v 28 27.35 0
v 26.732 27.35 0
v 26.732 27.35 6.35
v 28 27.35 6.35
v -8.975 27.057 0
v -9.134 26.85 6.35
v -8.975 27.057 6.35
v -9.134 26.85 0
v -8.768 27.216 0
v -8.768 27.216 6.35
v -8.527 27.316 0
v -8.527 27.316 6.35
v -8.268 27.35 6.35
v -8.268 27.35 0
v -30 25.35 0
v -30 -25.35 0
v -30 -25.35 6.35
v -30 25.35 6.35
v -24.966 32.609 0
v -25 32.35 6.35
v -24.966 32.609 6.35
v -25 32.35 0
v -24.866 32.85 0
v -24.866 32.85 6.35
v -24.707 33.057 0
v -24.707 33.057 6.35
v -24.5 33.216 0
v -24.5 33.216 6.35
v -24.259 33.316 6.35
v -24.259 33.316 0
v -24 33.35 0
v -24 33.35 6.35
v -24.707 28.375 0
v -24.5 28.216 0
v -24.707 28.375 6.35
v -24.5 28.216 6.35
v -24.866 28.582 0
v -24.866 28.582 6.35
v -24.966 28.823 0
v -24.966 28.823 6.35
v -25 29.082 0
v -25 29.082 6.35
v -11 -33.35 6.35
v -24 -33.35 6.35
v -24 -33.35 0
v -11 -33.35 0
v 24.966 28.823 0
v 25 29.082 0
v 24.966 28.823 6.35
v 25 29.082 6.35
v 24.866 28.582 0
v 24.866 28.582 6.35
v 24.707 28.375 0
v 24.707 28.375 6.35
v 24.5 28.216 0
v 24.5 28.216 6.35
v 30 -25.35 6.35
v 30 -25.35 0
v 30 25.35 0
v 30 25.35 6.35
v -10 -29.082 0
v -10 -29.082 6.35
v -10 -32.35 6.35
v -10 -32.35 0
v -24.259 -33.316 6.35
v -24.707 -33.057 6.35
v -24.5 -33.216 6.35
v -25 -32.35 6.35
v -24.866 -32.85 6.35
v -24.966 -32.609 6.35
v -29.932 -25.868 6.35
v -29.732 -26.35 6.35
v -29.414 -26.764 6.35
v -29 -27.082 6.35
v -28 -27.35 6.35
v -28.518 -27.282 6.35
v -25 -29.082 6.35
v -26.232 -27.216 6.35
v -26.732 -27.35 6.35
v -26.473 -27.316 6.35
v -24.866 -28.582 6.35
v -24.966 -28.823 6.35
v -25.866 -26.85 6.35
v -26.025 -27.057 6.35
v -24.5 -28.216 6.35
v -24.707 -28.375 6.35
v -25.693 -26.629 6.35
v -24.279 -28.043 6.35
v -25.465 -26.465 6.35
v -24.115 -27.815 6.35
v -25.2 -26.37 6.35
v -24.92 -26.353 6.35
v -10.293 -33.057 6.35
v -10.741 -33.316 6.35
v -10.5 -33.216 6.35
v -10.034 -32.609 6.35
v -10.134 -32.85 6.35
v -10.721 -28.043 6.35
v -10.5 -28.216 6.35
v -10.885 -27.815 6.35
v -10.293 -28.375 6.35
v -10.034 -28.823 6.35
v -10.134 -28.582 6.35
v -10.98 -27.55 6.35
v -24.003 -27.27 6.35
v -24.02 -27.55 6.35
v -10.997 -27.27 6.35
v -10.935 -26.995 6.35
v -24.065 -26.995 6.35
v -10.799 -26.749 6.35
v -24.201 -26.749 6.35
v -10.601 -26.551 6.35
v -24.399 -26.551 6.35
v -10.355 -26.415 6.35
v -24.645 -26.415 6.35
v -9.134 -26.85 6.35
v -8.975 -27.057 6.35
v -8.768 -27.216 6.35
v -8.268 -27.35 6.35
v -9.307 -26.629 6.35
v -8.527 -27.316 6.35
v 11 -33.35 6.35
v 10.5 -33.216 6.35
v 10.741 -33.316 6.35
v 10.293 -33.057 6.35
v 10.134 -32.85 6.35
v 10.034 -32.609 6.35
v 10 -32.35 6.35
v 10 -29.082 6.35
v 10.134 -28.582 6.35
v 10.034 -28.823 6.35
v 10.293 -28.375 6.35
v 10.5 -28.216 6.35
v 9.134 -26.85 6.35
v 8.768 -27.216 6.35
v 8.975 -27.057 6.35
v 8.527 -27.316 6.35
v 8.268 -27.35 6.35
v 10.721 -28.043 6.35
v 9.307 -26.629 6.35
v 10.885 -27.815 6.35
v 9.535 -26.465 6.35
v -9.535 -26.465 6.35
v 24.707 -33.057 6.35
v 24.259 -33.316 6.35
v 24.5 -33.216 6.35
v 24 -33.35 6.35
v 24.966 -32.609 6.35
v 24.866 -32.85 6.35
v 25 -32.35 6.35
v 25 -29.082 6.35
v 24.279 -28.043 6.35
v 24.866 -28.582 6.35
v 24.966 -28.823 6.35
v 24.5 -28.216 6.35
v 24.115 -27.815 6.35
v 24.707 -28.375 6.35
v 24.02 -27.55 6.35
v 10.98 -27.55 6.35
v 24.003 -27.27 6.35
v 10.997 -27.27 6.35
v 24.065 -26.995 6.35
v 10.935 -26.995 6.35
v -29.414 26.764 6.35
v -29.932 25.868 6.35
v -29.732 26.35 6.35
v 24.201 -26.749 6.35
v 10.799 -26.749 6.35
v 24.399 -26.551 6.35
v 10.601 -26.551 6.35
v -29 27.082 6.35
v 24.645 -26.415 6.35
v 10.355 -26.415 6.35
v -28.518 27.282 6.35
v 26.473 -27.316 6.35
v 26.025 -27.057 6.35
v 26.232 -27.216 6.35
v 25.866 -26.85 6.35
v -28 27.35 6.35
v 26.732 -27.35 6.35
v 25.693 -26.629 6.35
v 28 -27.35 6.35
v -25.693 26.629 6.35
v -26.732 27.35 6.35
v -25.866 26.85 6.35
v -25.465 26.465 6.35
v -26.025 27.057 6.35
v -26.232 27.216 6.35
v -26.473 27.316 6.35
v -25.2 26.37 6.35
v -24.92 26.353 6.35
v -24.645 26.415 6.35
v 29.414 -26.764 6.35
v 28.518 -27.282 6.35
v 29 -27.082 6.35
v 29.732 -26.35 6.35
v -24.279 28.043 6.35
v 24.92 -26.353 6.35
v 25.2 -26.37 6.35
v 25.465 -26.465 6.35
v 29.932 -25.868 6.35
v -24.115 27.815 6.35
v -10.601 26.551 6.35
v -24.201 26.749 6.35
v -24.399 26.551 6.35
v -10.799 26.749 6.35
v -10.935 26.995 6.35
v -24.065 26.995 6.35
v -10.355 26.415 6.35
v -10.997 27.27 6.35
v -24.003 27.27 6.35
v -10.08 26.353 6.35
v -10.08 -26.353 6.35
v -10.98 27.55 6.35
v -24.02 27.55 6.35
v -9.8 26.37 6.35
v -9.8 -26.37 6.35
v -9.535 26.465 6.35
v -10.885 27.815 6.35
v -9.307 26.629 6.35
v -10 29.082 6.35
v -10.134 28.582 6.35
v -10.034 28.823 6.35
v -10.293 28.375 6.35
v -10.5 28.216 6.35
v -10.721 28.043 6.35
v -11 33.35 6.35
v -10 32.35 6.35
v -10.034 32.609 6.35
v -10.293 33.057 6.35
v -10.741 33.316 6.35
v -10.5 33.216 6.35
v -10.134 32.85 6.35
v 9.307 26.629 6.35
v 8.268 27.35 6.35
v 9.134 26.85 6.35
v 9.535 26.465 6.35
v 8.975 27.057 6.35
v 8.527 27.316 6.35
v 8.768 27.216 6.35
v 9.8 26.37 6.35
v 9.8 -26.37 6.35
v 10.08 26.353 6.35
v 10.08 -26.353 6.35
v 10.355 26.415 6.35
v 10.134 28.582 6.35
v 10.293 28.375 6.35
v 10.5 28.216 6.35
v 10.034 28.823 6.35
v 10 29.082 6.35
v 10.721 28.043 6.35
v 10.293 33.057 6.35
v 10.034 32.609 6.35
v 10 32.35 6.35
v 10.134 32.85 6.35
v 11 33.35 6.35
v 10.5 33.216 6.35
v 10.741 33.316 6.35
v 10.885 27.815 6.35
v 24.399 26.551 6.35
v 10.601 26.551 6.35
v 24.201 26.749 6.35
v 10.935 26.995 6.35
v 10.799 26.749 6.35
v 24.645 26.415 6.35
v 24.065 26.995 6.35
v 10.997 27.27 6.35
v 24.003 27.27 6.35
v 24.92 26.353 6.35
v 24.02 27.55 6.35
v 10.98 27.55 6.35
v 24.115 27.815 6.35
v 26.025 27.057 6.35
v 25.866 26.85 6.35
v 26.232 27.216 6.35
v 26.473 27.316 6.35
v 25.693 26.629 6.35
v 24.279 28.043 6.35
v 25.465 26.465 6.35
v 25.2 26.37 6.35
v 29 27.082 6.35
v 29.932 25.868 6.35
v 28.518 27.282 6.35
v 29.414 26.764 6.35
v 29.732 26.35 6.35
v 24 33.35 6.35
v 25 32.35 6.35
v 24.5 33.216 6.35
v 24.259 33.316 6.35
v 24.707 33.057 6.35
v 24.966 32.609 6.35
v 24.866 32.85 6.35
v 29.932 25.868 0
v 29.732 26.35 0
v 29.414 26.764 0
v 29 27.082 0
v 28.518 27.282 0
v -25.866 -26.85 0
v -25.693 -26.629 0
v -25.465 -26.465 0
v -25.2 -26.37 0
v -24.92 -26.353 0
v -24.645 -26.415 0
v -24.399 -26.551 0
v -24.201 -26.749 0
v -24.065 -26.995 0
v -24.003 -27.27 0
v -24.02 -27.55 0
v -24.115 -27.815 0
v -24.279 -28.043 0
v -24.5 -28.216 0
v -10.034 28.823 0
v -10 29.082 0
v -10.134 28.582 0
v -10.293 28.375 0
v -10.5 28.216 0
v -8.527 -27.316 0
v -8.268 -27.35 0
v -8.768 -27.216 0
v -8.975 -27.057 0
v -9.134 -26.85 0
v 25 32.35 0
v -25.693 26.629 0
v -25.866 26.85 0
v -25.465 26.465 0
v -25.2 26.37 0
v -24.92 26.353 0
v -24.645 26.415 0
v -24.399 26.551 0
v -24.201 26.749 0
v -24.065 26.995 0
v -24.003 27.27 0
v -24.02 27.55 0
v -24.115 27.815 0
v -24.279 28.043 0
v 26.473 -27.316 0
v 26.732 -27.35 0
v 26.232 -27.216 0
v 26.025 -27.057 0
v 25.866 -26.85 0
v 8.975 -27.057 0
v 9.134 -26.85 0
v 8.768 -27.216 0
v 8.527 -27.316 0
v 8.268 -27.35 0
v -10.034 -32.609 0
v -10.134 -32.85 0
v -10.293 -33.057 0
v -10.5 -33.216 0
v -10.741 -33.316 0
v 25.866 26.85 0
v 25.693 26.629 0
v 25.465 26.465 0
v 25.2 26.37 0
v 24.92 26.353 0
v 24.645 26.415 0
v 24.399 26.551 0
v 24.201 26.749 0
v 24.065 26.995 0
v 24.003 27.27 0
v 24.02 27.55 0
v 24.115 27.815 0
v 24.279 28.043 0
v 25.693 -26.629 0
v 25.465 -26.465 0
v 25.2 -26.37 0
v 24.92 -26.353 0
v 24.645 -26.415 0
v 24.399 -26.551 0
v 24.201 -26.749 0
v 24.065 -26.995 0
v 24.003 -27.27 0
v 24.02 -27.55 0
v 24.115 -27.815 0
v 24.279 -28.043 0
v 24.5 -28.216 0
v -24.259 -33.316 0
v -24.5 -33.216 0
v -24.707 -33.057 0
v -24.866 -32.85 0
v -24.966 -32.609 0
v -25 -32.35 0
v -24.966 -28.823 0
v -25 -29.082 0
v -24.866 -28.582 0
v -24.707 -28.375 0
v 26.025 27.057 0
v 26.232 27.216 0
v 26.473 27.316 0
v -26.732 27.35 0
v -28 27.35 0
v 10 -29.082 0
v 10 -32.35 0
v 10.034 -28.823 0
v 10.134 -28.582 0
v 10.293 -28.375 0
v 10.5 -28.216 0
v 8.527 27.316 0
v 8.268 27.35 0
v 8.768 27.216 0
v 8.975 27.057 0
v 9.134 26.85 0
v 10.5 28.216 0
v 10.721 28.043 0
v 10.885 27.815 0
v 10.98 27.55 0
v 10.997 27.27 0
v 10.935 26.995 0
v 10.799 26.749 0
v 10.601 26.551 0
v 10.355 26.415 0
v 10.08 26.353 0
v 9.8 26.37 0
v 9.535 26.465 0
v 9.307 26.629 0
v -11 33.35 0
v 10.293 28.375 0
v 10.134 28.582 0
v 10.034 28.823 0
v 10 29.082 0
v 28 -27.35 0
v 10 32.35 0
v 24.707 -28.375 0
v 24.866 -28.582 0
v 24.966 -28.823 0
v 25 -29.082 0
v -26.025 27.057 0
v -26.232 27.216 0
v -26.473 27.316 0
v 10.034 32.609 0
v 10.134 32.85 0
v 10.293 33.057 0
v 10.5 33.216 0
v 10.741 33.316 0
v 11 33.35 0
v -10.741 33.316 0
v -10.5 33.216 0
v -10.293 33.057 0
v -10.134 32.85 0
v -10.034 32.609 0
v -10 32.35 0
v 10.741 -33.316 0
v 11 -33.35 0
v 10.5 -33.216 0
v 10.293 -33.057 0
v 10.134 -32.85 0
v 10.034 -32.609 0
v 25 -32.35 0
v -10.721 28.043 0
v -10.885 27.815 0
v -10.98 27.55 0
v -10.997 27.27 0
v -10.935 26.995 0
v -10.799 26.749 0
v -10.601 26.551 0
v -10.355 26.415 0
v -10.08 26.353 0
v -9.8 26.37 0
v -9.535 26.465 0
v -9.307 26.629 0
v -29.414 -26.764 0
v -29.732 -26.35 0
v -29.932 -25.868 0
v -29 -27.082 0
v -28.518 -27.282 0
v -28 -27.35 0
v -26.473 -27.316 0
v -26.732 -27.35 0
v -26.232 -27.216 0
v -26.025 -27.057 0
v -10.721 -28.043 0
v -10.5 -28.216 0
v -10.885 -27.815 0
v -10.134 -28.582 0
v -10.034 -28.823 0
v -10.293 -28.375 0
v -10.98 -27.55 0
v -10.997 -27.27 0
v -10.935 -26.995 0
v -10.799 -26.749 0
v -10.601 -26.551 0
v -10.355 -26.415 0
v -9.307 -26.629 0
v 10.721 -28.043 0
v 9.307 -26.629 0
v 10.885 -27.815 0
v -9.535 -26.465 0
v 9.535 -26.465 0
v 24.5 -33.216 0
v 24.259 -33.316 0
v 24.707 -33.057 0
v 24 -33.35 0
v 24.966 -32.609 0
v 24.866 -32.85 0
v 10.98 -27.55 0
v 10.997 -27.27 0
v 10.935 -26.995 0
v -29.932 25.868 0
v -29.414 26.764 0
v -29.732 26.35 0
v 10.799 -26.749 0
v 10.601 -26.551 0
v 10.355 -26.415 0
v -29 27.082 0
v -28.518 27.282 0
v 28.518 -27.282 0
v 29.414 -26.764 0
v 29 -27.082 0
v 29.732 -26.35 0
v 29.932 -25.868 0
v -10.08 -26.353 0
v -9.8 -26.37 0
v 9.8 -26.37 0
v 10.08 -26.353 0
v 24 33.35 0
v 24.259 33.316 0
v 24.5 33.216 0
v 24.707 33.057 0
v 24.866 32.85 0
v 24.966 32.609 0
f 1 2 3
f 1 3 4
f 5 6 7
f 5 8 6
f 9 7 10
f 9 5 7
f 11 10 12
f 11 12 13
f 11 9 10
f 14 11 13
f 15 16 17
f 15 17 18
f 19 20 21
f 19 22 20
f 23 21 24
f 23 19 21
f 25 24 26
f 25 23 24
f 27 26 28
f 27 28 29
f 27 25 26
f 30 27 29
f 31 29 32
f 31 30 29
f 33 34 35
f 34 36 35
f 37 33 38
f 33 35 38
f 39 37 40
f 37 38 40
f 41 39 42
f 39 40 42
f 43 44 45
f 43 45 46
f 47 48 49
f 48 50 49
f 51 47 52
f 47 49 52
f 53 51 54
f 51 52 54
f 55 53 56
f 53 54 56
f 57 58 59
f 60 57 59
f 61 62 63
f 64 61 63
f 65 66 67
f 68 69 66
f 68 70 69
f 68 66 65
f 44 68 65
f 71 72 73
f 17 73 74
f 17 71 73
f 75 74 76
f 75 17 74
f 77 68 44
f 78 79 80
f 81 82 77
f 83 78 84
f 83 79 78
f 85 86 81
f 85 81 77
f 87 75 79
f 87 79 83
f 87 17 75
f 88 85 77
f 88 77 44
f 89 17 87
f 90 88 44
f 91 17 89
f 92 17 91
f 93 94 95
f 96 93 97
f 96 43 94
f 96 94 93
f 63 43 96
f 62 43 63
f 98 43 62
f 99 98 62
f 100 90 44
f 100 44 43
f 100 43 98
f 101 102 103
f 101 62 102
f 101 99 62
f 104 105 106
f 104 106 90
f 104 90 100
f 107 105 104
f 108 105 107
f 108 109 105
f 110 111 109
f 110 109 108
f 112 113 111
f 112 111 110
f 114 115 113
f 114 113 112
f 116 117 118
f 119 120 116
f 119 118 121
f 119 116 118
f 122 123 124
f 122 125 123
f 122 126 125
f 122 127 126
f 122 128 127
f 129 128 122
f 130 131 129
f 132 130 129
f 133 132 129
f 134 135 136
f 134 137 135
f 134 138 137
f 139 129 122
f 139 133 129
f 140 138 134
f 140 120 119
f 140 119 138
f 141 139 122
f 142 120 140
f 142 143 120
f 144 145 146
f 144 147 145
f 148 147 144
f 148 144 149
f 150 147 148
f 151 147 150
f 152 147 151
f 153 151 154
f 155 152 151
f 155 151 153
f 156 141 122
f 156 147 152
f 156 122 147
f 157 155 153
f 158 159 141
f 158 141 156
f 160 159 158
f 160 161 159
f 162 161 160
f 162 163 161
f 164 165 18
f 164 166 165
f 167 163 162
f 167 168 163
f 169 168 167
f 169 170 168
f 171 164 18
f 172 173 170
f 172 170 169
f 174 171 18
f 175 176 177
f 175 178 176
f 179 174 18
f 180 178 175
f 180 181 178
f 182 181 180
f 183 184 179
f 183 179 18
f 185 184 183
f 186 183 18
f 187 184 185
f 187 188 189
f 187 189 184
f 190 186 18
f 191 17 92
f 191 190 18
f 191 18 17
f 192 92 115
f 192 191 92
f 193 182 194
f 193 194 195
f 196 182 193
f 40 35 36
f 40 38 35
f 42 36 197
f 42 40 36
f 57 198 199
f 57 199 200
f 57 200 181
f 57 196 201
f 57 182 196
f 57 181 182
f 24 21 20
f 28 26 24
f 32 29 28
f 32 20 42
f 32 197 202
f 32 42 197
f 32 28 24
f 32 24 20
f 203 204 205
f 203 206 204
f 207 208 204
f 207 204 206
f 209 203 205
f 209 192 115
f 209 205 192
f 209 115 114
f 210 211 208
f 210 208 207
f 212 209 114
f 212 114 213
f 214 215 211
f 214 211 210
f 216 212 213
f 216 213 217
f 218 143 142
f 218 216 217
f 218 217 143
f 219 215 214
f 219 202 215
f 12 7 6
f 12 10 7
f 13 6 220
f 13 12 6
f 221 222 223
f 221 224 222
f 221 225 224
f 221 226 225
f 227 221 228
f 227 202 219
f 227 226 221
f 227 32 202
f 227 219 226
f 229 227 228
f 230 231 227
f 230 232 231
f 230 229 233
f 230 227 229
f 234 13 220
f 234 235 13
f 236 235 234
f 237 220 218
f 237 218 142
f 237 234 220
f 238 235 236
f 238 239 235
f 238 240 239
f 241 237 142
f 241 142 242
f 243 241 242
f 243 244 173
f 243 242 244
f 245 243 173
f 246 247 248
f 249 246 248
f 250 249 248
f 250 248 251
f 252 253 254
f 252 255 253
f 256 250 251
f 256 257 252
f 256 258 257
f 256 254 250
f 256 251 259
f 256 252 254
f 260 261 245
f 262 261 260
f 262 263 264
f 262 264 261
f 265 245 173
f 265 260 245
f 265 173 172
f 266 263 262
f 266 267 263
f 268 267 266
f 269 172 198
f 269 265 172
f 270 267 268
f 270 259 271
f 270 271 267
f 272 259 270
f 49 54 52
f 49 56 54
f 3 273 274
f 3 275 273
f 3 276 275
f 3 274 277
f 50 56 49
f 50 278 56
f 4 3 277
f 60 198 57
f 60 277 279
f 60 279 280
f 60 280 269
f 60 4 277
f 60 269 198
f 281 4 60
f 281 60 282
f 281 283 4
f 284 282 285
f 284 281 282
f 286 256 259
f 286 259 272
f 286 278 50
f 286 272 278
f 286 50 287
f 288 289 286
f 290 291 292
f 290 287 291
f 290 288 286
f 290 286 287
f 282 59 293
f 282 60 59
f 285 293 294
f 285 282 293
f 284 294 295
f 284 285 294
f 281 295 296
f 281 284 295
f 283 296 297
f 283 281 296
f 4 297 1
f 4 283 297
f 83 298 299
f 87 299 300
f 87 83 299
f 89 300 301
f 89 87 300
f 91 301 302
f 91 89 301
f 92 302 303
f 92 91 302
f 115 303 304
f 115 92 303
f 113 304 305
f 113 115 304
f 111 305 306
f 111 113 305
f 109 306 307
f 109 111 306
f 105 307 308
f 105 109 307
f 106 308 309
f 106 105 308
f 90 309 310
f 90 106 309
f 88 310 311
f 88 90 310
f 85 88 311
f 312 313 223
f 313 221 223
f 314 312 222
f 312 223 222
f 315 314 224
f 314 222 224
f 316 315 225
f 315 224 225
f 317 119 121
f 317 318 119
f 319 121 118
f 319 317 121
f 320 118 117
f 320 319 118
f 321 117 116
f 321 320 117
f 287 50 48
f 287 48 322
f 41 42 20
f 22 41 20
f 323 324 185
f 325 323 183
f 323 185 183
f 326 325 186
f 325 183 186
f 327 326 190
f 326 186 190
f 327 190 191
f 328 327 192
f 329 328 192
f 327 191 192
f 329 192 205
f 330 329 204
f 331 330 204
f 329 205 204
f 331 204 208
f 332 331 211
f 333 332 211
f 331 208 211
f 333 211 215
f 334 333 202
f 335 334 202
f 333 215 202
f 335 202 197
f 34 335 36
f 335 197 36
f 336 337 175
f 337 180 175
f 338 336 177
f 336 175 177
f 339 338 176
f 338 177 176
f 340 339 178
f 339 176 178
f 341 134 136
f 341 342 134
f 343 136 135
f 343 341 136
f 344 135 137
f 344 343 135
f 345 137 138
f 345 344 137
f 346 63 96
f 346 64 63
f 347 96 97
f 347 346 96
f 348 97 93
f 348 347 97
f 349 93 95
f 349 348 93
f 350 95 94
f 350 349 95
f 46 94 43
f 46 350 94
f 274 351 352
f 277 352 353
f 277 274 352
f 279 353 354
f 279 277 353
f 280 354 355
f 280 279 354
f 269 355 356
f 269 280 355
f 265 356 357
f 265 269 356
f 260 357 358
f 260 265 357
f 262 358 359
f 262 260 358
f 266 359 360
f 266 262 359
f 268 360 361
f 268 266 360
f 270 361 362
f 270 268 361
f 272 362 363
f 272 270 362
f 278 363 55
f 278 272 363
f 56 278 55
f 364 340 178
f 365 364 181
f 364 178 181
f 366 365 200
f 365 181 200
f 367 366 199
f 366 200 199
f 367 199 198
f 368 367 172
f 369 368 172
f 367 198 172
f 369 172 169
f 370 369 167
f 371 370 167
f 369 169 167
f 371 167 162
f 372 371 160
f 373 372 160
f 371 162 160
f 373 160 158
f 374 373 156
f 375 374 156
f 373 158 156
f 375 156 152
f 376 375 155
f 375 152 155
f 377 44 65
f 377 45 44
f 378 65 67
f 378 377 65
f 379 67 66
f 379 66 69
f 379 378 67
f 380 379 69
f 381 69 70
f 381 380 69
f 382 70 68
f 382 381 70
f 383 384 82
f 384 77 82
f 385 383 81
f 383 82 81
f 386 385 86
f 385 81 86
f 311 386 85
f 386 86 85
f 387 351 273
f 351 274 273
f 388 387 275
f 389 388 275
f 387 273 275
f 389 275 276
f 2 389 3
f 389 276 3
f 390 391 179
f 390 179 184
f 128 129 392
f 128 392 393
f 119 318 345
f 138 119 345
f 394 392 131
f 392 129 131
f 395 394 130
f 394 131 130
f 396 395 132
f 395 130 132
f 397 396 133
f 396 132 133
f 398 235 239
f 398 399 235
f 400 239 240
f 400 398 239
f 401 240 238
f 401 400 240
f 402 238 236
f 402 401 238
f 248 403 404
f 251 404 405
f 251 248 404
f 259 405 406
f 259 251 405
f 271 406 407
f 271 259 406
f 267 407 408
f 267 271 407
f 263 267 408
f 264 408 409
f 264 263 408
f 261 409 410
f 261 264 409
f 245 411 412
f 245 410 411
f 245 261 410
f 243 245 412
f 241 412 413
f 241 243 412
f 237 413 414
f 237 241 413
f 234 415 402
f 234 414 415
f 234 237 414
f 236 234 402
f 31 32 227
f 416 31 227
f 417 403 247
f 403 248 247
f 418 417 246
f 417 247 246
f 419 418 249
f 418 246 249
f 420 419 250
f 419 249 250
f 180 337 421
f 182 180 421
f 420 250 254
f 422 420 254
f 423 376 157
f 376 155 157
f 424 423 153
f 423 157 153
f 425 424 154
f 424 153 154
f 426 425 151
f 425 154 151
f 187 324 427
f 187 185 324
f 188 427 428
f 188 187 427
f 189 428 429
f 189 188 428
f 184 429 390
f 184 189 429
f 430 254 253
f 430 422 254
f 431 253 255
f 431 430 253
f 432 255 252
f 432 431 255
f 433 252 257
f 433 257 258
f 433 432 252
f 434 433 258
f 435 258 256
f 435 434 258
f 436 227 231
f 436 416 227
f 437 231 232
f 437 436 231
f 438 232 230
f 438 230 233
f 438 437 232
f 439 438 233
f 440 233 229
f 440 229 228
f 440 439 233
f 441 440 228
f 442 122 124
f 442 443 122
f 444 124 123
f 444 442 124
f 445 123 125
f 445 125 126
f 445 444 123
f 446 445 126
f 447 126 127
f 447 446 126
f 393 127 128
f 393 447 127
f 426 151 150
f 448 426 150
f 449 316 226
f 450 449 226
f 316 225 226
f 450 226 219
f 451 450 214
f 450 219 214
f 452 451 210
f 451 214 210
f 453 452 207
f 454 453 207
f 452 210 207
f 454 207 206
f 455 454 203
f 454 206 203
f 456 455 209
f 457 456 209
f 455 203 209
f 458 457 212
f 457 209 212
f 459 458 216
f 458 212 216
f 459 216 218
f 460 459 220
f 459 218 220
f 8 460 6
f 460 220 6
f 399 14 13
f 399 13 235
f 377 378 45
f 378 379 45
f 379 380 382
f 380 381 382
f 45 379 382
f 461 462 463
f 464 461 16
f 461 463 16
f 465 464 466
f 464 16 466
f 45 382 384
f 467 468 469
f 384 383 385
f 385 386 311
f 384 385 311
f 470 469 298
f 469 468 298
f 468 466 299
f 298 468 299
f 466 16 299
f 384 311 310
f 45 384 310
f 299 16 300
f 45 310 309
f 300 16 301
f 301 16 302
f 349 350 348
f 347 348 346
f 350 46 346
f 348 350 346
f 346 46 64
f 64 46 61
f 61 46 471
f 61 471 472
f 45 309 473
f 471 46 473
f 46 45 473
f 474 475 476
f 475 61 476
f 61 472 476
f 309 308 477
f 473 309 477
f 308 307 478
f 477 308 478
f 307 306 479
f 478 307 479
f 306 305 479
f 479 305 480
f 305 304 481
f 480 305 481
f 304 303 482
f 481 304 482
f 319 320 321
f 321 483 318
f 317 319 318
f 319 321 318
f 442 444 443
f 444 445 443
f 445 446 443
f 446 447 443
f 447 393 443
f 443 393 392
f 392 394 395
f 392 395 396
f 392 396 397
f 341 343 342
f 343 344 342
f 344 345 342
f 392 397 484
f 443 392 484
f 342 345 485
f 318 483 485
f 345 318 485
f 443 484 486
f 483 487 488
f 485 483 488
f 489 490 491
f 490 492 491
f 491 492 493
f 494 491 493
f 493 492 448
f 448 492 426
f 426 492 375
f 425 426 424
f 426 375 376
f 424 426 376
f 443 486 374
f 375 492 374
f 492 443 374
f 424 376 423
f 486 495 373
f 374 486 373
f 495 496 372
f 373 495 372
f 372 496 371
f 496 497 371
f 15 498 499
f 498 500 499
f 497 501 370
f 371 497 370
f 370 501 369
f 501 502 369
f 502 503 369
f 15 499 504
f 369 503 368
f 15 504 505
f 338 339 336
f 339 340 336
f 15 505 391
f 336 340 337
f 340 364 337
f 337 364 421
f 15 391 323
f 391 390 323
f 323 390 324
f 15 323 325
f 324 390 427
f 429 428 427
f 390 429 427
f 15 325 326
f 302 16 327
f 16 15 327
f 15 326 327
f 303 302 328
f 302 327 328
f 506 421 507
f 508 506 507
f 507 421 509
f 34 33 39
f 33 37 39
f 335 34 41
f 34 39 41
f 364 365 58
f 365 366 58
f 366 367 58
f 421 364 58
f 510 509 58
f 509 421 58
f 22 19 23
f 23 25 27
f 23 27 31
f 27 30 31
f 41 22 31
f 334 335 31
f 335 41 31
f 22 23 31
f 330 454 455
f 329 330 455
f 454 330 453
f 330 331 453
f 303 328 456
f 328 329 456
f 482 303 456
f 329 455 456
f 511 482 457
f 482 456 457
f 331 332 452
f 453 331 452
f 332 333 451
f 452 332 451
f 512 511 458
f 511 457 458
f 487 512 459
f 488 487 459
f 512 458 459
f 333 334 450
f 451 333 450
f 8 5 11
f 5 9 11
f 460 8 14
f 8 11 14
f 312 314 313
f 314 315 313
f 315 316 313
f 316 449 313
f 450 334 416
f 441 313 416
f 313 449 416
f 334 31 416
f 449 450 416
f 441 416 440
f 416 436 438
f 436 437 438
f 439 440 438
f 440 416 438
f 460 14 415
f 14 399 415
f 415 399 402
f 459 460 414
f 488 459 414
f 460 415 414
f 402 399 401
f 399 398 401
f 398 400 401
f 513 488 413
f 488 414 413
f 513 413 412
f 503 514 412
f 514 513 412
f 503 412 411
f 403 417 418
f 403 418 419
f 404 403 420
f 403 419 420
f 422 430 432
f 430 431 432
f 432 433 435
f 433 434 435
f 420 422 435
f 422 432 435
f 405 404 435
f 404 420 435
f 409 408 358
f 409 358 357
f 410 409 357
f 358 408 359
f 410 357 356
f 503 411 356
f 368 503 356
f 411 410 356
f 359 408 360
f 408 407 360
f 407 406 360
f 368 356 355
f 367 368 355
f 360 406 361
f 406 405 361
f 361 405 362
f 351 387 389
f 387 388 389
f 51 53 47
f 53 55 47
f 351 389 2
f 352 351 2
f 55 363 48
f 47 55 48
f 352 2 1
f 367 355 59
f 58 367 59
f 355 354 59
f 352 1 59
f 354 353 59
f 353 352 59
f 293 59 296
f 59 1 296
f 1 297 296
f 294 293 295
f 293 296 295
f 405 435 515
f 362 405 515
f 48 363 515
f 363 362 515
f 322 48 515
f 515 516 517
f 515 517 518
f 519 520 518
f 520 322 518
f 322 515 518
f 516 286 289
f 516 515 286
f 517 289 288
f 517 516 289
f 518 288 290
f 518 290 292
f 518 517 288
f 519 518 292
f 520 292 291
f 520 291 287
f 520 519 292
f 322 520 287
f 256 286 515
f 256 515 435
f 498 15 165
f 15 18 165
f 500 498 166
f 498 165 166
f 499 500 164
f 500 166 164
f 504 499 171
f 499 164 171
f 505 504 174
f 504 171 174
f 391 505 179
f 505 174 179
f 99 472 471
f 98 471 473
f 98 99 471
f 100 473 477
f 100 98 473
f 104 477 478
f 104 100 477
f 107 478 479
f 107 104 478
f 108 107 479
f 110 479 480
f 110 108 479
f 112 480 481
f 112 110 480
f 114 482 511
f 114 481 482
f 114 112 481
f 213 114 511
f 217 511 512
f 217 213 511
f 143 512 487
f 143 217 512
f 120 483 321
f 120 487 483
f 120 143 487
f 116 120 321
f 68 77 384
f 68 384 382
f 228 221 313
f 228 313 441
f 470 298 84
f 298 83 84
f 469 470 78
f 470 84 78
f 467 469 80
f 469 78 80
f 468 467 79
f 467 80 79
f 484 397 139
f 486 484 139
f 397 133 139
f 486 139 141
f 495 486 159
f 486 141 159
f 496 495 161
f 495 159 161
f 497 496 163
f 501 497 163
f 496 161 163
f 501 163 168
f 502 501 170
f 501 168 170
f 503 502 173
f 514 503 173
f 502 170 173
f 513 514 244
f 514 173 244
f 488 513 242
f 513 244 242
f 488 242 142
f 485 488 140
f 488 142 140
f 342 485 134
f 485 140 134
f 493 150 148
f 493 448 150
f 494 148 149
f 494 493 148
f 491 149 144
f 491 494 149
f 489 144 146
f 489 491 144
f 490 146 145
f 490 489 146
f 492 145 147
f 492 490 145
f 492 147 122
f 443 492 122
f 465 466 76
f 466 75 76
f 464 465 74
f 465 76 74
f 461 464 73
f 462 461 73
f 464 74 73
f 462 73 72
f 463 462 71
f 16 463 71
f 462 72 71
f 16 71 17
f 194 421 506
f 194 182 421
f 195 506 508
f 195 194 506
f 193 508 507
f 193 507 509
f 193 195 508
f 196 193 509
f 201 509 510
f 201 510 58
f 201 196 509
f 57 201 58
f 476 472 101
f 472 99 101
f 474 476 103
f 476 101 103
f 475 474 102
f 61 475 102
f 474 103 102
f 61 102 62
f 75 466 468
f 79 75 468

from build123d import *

# Parameters (mm, degrees)
SKETCH1_W               = 60
SKETCH1_H               = 54.7
BOSS_EXTRUDE1_DEPTH     = 6.35
SKETCH2_W               = 15
SKETCH2_H               = 6
BOSS_EXTRUDE2_DEPTH     = 6.35
SKETCH3_R               = 1
CUT_EXTRUDE1_DEPTH      = 7.35
MIRROR2_COPY_1_SKETCH_W = 15
MIRROR2_COPY_1_SKETCH_H = 6
MIRROR2_COPY_1_DEPTH    = 6.35
MIRROR2_COPY_2_SKETCH_R = 1
MIRROR2_COPY_2_DEPTH    = 7.35
FILLET1_R               = 1
FILLET2_R               = 2


with BuildPart() as part:
    # Sketch1 → Boss-Extrude1 (new body)
    with BuildSketch(Plane.XY):
        Rectangle(SKETCH1_W, SKETCH1_H)
    extrude(amount=BOSS_EXTRUDE1_DEPTH)

    # Sketch2 → Boss-Extrude2 (add)
    with BuildSketch(Plane.XY.offset(6.35)):
        with Locations((-17.5, 30.35)):
            Rectangle(SKETCH2_W, SKETCH2_H)
    boss_extrude2 = extrude(amount=-BOSS_EXTRUDE2_DEPTH)

    # Sketch3 → Cut-Extrude1 (cut, through all)
    with BuildSketch(Plane.XY.offset(6.35)):
        with Locations((-25, 27.35)):
            Circle(SKETCH3_R)
        with Locations((-10, 27.35)):
            Circle(SKETCH3_R)
    cut_extrude1 = extrude(amount=-CUT_EXTRUDE1_DEPTH, mode=Mode.SUBTRACT)

    # Mirror1: Boss-Extrude2, Cut-Extrude1 across plane
    add(boss_extrude2.mirror(Plane(origin=(0, 0, 0), x_dir=(0, 0, 1), z_dir=(1, 0, 0))))
    add(cut_extrude1.mirror(Plane(origin=(0, 0, 0), x_dir=(0, 0, 1), z_dir=(1, 0, 0))), mode=Mode.SUBTRACT)

    # Mirror2: Boss-Extrude2, Cut-Extrude1 across plane
    add(boss_extrude2.mirror(Plane.ZX))
    add(cut_extrude1.mirror(Plane.ZX), mode=Mode.SUBTRACT)

    # Mirror2 copy 1 sketch → Mirror2 copy 1 (add)
    with BuildSketch(Plane(origin=(0, 0, 6.35), x_dir=(-1, 0, 0), z_dir=(0, 0, 1))):
        with Locations((-17.5, 30.35)):
            Rectangle(MIRROR2_COPY_1_SKETCH_W, MIRROR2_COPY_1_SKETCH_H)
    extrude(amount=-MIRROR2_COPY_1_DEPTH)

    # Mirror2 copy 2 sketch → Mirror2 copy 2 (cut, through all)
    with BuildSketch(Plane(origin=(0, 0, 6.35), x_dir=(-1, 0, 0), z_dir=(0, 0, 1))):
        with Locations((-25, 27.35)):
            Circle(MIRROR2_COPY_2_SKETCH_R)
        with Locations((-10, 27.35)):
            Circle(MIRROR2_COPY_2_SKETCH_R)
    extrude(amount=-MIRROR2_COPY_2_DEPTH, mode=Mode.SUBTRACT)

    # Fillet1
    fillet1_edges = [part.edges().sort_by_distance(p)[0] for p in [
        (26, -27.35, 3.175),
        (9, -27.35, 3.175),
        (-10, -33.35, 3.175),
        (-25, -33.35, 3.175),
        (-25, -28.35, 3.175),
        (-10, -28.35, 3.175),
        (-26, -27.35, 3.175),
        (-9, -27.35, 3.175),
        (-25, 33.35, 3.175),
        (-10, 33.35, 3.175),
        (-10, 28.35, 3.175),
        (-25, 28.35, 3.175),
        (-26, 27.35, 3.175),
        (-9, 27.35, 3.175),
        (10, 33.35, 3.175),
        (25, 33.35, 3.175),
        (25, 28.35, 3.175),
        (10, 28.35, 3.175),
        (26, 27.35, 3.175),
        (9, 27.35, 3.175),
        (25, -33.35, 3.175),
        (10, -33.35, 3.175),
        (10, -28.35, 3.175),
        (25, -28.35, 3.175),
    ]]
    fillet(fillet1_edges, radius=FILLET1_R)

    # Fillet2
    fillet2_edges = [part.edges().sort_by_distance(p)[0] for p in [
        (-30, 27.35, 3.175),
        (30, 27.35, 3.175),
        (30, -27.35, 3.175),
        (-30, -27.35, 3.175),
    ]]
    fillet(fillet2_edges, radius=FILLET2_R)


solid = part.part
